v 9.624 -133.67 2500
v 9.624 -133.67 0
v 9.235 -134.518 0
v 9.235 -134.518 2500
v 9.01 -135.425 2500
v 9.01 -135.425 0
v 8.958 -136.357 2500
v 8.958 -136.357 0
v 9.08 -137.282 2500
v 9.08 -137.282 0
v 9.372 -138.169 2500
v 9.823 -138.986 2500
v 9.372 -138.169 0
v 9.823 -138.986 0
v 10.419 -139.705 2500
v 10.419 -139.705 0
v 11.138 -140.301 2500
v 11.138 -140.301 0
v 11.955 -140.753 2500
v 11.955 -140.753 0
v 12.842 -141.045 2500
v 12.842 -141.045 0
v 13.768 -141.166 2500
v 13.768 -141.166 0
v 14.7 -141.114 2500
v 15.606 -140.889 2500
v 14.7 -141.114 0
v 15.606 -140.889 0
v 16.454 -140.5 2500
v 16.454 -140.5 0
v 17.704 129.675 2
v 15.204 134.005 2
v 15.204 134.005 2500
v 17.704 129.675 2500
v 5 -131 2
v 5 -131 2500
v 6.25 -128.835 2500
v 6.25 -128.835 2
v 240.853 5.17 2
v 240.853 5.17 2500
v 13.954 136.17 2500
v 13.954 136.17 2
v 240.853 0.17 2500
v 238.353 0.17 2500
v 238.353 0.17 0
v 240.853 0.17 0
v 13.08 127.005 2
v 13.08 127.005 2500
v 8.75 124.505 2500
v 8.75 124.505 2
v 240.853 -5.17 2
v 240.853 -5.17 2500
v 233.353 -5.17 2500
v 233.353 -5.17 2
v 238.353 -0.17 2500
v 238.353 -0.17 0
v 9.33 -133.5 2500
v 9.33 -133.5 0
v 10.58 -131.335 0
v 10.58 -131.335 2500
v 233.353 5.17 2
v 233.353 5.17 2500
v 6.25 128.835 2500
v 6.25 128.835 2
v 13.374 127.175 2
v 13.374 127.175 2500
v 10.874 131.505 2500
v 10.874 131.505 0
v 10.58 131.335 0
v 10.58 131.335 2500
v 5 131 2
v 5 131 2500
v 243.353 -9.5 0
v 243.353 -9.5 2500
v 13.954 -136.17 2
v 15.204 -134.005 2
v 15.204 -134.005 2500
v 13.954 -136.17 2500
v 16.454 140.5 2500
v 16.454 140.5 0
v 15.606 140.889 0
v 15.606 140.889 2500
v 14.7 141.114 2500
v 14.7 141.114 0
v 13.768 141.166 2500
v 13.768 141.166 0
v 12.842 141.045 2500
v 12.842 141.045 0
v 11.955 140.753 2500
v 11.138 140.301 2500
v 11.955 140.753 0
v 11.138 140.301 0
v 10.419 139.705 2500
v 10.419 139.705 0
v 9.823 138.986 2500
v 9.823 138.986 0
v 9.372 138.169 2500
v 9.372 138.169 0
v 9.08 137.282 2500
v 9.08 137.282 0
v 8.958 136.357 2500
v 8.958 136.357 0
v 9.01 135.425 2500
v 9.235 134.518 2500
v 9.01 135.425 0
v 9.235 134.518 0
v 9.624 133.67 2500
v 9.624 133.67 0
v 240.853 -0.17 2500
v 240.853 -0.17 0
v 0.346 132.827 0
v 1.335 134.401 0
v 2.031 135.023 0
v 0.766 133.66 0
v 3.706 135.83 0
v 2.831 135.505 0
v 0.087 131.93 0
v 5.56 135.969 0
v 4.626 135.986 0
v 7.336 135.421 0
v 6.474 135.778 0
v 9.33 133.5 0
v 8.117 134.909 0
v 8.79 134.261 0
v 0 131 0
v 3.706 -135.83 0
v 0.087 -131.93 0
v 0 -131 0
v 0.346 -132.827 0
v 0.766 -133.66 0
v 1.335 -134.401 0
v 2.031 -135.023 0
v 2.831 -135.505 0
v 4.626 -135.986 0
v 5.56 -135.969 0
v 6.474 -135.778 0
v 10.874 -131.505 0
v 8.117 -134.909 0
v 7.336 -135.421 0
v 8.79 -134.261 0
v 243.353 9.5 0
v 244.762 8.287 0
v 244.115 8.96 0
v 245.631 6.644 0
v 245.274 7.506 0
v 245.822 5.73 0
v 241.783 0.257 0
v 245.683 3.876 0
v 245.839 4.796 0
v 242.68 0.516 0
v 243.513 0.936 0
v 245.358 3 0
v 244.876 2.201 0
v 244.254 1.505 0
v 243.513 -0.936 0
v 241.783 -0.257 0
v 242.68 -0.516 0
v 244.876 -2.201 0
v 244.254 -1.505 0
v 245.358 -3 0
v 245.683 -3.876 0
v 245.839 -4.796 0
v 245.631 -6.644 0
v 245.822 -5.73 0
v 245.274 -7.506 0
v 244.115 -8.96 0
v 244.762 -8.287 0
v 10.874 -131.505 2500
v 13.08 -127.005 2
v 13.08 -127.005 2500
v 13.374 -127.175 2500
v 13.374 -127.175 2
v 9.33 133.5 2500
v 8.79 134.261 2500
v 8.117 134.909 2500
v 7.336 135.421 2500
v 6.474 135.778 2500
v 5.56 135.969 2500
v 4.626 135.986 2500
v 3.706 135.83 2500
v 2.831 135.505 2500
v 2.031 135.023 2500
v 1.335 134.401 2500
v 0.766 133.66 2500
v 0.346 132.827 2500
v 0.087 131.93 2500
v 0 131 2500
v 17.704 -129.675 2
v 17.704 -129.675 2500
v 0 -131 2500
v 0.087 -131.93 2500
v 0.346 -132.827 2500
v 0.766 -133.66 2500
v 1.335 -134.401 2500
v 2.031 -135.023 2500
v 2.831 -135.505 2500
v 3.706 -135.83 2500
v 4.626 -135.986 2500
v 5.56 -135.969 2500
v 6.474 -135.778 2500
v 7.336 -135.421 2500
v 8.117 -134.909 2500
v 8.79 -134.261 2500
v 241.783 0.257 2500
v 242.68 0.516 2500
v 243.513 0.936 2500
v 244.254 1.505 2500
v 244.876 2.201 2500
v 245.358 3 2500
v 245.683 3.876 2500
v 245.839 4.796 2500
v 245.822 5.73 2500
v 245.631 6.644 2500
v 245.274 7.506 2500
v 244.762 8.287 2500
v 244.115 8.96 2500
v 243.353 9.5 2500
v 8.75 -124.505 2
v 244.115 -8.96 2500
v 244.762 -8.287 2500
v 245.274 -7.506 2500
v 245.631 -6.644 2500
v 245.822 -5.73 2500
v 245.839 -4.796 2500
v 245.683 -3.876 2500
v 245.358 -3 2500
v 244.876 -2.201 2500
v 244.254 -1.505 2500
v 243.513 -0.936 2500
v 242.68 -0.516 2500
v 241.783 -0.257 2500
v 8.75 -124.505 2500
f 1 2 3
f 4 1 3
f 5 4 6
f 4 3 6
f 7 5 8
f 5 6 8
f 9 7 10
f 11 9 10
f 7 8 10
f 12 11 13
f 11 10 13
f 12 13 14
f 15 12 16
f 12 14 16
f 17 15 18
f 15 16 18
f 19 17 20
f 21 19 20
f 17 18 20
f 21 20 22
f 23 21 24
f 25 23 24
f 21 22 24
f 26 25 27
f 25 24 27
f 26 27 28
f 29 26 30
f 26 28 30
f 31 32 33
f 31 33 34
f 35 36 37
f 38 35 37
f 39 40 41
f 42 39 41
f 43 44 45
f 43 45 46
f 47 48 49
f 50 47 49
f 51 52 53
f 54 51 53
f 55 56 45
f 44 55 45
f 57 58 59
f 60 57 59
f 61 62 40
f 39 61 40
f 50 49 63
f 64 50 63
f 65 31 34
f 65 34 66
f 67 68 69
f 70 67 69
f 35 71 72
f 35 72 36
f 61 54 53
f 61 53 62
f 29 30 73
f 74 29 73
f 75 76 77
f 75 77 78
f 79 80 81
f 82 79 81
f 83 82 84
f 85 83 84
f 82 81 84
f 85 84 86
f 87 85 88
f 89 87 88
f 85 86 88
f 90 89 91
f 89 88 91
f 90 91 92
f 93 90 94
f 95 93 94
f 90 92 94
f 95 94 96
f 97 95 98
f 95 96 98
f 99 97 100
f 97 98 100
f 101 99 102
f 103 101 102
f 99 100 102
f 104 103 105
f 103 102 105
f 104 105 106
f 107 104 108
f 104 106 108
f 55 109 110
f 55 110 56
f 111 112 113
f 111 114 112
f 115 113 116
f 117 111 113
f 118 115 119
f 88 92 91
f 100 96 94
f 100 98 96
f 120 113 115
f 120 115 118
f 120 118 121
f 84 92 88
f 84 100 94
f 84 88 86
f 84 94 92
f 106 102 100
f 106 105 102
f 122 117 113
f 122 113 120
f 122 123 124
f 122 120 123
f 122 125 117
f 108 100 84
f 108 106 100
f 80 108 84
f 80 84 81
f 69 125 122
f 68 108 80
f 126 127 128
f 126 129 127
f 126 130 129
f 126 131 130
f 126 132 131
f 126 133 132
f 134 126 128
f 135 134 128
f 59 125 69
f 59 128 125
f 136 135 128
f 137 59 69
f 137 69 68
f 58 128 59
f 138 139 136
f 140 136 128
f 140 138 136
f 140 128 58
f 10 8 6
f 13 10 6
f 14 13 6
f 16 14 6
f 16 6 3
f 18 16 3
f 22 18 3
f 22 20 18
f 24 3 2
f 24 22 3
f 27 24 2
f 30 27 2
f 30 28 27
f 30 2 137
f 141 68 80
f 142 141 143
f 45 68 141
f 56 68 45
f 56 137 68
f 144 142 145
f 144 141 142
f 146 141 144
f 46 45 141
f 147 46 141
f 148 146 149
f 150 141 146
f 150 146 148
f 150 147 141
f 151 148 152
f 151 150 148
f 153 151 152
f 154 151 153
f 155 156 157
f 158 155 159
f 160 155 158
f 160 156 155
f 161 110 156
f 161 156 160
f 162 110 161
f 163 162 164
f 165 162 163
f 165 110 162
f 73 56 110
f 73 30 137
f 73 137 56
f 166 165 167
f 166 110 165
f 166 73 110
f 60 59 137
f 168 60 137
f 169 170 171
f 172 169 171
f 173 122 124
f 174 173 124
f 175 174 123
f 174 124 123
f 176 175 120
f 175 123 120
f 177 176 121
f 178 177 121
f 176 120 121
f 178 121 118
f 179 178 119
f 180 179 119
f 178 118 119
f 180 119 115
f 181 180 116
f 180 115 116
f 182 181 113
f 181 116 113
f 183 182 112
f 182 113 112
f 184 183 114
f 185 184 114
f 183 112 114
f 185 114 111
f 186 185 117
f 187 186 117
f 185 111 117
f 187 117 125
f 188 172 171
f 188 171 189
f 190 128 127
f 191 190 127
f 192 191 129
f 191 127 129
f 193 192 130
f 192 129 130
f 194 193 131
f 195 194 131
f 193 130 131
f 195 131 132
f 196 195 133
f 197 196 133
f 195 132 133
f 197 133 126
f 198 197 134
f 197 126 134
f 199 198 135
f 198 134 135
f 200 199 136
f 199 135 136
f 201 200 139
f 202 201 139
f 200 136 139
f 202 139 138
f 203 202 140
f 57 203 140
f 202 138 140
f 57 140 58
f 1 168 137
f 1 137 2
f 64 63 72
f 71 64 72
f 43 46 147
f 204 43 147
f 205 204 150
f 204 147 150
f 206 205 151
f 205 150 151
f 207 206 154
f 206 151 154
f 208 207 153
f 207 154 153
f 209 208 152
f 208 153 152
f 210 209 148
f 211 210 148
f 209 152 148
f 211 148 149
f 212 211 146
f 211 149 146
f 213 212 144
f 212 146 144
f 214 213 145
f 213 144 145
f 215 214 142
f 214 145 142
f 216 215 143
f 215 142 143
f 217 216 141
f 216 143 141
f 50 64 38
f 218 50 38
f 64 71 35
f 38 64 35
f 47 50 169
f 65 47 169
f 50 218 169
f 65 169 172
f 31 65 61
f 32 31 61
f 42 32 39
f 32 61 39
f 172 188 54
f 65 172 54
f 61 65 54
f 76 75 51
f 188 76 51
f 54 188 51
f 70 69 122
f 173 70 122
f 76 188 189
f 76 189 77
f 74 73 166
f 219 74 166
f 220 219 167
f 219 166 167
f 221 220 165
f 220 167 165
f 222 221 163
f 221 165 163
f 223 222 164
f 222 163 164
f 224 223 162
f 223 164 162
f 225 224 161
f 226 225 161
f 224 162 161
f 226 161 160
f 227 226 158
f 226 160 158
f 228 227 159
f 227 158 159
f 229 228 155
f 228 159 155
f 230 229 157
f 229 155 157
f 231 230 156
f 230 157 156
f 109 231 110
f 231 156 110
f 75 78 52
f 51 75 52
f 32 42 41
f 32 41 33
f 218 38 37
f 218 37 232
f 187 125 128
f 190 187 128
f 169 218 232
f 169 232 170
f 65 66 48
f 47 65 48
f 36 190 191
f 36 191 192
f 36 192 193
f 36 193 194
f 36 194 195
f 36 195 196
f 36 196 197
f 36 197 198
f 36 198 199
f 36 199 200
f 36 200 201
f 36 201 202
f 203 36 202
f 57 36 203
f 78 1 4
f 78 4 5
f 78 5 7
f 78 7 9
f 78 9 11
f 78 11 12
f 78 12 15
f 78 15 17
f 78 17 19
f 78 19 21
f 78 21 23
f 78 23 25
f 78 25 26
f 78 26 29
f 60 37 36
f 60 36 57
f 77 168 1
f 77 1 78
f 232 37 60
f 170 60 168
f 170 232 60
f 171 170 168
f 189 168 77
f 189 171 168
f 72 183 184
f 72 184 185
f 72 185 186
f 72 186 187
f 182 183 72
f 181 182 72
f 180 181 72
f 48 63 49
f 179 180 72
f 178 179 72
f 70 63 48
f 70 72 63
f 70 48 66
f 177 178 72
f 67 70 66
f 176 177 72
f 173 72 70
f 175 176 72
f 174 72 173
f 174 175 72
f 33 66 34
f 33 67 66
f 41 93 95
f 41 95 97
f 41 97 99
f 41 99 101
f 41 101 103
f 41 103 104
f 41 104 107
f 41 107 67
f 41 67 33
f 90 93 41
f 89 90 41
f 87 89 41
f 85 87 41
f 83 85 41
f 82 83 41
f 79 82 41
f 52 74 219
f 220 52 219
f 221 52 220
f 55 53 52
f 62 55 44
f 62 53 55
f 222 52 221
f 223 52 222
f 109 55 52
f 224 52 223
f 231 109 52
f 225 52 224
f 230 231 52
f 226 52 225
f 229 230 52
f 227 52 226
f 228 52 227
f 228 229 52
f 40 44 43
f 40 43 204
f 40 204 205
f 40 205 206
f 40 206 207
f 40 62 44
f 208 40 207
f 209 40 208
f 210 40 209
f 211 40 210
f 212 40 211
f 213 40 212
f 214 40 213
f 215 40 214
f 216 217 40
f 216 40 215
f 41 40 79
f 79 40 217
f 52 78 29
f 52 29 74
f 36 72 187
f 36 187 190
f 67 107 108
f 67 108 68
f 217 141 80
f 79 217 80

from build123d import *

# Parameters (mm, degrees)
F1_DEPTH    = 2500
F2_T        = 5
F2_T3_DEPTH = 2510
F4_DEPTH    = 2


# Not quite as in the source:
# - a shell that OpenCascade refuses in one call is made with other operations: the cavity is built on its own and cut out


with BuildPart() as f1:
    # F0 (on Top) → F1 (new body)
    with BuildSketch(Plane.XY):
        with BuildLine():
            Line((243.3531384634, 9.5), (16.4544826719, 140.5))
            ThreePointArc((16.4544826719, 140.5), (10.418948766, 139.705406887), (9.624355653, 133.6698729811))
            Line((9.624355653, 133.6698729811), (10.874355653, 131.5048094716))
            Line((10.874355653, 131.5048094716), (10.5801270189, 131.3349364905))
            Line((10.5801270189, 131.3349364905), (9.3301270189, 133.5))
            ThreePointArc((9.3301270189, 133.5), (3.7059047745, 135.8296291314), (0, 131))
            Line((0, 131), (0, -131))
            ThreePointArc((0, -131), (3.7059047745, -135.8296291314), (9.3301270189, -133.5))
            Line((9.3301270189, -133.5), (10.5801270189, -131.3349364905))
            Line((10.5801270189, -131.3349364905), (10.874355653, -131.5048094716))
            Line((10.874355653, -131.5048094716), (9.624355653, -133.6698729811))
            ThreePointArc((9.624355653, -133.6698729811), (10.418948766, -139.705406887), (16.4544826719, -140.5))
            Line((16.4544826719, -140.5), (243.3531384634, -9.5))
            ThreePointArc((243.3531384634, -9.5), (245.6827675949, -3.8757777556), (240.8531384634, -0.1698729811))
            Line((240.8531384634, -0.1698729811), (238.3531384634, -0.1698729811))
            Line((238.3531384634, -0.1698729811), (238.3531384634, 0.1698729811))
            Line((238.3531384634, 0.1698729811), (240.8531384634, 0.1698729811))
            ThreePointArc((240.8531384634, 0.1698729811), (245.6827675949, 3.8757777556), (243.3531384634, 9.5))
        make_face()
    extrude(amount=F1_DEPTH)

    # F2: shell of thickness 5, made by hand


with BuildPart() as f2_core1:
    # F2_t2: copy of F1
    add(f1.part)

    # the walls: a layer under each face that stays
    f2_faces = [f2_core1.faces().sort_by_distance(p)[0] for p in [
        (129.9038105677, 75, 1250),
        (10.249355653, 132.5873412263, 1250),
        (10.727241336, 131.4198729811, 1250),
        (9.9551270189, 132.4174682453, 1250),
        (0, 0, 1250),
        (9.9551270189, -132.4174682453, 1250),
        (10.727241336, -131.4198729811, 1250),
        (10.249355653, -132.5873412263, 1250),
        (129.9038105677, -75, 1250),
        (239.6031384634, -0.1698729811, 1250),
        (238.3531384634, 0, 1250),
        (239.6031384634, 0.1698729811, 1250),
    ]]
    thicken(f2_faces, amount=-F2_T, mode=Mode.SUBTRACT)

    # F2_s4 → F2_t3 (cut)
    with BuildSketch(Plane.XY.offset(-5)):
        Polygon((10.8060543828, 131.5231107418), (15.2044826719, 134.0048094716), (17.7044826719, 129.6746824527), (13.374355653, 127.1746824527), align=None)
        Polygon((10.5984282891, 131.4032377607), (13.0801270189, 127.0048094716), (8.75, 124.5048094716), (6.25, 128.8349364905), align=None)
        Polygon((10.5984282891, -131.4032377607), (6.25, -128.8349364905), (8.75, -124.5048094716), (13.0801270189, -127.0048094716), align=None)
        Polygon((10.8060543828, -131.5231107418), (13.374355653, -127.1746824527), (17.7044826719, -129.6746824527), (15.2044826719, -134.0048094716), align=None)
        Polygon((238.4031384634, -0.1198729811), (238.3531384634, -5.1698729811), (233.3531384634, -5.1698729811), (233.3531384634, -0.1698729811), align=None)
        Polygon((238.4031384634, 0.1198729811), (233.3531384634, 0.1698729811), (233.3531384634, 5.1698729811), (238.3531384634, 5.1698729811), align=None)
    extrude(amount=F2_T3_DEPTH, mode=Mode.SUBTRACT)


with BuildPart() as f1_1:
    add(f1.part)

    # what is left inside the walls is the cavity
    f2_cavity = [f2_core1.part.solids().sort_by_distance(p)[0] for p in [
        (5.05, 0, 1666.666667),
    ]]
    add(f2_cavity, mode=Mode.SUBTRACT)

    # F3 (on face) → F4 (join)
    with BuildSketch(Plane(origin=(0, 0, 0), x_dir=(1, 0, 0), z_dir=(0, 0, -1))):
        Polygon((8.75, 124.5048094716), (5, 131), (5, -131), (8.75, -124.5048094716), (17.7044826719, -129.6746824527), (13.9544826719, -136.1698729811), (240.8531384634, -5.1698729811), (233.3531384634, -5.1698729811), (233.3531384634, 5.1698729811), (240.8531384634, 5.1698729811), (13.9544826719, 136.1698729811), (17.7044826719, 129.6746824527), align=None)
    extrude(amount=-F4_DEPTH)


solid = f1_1.part
